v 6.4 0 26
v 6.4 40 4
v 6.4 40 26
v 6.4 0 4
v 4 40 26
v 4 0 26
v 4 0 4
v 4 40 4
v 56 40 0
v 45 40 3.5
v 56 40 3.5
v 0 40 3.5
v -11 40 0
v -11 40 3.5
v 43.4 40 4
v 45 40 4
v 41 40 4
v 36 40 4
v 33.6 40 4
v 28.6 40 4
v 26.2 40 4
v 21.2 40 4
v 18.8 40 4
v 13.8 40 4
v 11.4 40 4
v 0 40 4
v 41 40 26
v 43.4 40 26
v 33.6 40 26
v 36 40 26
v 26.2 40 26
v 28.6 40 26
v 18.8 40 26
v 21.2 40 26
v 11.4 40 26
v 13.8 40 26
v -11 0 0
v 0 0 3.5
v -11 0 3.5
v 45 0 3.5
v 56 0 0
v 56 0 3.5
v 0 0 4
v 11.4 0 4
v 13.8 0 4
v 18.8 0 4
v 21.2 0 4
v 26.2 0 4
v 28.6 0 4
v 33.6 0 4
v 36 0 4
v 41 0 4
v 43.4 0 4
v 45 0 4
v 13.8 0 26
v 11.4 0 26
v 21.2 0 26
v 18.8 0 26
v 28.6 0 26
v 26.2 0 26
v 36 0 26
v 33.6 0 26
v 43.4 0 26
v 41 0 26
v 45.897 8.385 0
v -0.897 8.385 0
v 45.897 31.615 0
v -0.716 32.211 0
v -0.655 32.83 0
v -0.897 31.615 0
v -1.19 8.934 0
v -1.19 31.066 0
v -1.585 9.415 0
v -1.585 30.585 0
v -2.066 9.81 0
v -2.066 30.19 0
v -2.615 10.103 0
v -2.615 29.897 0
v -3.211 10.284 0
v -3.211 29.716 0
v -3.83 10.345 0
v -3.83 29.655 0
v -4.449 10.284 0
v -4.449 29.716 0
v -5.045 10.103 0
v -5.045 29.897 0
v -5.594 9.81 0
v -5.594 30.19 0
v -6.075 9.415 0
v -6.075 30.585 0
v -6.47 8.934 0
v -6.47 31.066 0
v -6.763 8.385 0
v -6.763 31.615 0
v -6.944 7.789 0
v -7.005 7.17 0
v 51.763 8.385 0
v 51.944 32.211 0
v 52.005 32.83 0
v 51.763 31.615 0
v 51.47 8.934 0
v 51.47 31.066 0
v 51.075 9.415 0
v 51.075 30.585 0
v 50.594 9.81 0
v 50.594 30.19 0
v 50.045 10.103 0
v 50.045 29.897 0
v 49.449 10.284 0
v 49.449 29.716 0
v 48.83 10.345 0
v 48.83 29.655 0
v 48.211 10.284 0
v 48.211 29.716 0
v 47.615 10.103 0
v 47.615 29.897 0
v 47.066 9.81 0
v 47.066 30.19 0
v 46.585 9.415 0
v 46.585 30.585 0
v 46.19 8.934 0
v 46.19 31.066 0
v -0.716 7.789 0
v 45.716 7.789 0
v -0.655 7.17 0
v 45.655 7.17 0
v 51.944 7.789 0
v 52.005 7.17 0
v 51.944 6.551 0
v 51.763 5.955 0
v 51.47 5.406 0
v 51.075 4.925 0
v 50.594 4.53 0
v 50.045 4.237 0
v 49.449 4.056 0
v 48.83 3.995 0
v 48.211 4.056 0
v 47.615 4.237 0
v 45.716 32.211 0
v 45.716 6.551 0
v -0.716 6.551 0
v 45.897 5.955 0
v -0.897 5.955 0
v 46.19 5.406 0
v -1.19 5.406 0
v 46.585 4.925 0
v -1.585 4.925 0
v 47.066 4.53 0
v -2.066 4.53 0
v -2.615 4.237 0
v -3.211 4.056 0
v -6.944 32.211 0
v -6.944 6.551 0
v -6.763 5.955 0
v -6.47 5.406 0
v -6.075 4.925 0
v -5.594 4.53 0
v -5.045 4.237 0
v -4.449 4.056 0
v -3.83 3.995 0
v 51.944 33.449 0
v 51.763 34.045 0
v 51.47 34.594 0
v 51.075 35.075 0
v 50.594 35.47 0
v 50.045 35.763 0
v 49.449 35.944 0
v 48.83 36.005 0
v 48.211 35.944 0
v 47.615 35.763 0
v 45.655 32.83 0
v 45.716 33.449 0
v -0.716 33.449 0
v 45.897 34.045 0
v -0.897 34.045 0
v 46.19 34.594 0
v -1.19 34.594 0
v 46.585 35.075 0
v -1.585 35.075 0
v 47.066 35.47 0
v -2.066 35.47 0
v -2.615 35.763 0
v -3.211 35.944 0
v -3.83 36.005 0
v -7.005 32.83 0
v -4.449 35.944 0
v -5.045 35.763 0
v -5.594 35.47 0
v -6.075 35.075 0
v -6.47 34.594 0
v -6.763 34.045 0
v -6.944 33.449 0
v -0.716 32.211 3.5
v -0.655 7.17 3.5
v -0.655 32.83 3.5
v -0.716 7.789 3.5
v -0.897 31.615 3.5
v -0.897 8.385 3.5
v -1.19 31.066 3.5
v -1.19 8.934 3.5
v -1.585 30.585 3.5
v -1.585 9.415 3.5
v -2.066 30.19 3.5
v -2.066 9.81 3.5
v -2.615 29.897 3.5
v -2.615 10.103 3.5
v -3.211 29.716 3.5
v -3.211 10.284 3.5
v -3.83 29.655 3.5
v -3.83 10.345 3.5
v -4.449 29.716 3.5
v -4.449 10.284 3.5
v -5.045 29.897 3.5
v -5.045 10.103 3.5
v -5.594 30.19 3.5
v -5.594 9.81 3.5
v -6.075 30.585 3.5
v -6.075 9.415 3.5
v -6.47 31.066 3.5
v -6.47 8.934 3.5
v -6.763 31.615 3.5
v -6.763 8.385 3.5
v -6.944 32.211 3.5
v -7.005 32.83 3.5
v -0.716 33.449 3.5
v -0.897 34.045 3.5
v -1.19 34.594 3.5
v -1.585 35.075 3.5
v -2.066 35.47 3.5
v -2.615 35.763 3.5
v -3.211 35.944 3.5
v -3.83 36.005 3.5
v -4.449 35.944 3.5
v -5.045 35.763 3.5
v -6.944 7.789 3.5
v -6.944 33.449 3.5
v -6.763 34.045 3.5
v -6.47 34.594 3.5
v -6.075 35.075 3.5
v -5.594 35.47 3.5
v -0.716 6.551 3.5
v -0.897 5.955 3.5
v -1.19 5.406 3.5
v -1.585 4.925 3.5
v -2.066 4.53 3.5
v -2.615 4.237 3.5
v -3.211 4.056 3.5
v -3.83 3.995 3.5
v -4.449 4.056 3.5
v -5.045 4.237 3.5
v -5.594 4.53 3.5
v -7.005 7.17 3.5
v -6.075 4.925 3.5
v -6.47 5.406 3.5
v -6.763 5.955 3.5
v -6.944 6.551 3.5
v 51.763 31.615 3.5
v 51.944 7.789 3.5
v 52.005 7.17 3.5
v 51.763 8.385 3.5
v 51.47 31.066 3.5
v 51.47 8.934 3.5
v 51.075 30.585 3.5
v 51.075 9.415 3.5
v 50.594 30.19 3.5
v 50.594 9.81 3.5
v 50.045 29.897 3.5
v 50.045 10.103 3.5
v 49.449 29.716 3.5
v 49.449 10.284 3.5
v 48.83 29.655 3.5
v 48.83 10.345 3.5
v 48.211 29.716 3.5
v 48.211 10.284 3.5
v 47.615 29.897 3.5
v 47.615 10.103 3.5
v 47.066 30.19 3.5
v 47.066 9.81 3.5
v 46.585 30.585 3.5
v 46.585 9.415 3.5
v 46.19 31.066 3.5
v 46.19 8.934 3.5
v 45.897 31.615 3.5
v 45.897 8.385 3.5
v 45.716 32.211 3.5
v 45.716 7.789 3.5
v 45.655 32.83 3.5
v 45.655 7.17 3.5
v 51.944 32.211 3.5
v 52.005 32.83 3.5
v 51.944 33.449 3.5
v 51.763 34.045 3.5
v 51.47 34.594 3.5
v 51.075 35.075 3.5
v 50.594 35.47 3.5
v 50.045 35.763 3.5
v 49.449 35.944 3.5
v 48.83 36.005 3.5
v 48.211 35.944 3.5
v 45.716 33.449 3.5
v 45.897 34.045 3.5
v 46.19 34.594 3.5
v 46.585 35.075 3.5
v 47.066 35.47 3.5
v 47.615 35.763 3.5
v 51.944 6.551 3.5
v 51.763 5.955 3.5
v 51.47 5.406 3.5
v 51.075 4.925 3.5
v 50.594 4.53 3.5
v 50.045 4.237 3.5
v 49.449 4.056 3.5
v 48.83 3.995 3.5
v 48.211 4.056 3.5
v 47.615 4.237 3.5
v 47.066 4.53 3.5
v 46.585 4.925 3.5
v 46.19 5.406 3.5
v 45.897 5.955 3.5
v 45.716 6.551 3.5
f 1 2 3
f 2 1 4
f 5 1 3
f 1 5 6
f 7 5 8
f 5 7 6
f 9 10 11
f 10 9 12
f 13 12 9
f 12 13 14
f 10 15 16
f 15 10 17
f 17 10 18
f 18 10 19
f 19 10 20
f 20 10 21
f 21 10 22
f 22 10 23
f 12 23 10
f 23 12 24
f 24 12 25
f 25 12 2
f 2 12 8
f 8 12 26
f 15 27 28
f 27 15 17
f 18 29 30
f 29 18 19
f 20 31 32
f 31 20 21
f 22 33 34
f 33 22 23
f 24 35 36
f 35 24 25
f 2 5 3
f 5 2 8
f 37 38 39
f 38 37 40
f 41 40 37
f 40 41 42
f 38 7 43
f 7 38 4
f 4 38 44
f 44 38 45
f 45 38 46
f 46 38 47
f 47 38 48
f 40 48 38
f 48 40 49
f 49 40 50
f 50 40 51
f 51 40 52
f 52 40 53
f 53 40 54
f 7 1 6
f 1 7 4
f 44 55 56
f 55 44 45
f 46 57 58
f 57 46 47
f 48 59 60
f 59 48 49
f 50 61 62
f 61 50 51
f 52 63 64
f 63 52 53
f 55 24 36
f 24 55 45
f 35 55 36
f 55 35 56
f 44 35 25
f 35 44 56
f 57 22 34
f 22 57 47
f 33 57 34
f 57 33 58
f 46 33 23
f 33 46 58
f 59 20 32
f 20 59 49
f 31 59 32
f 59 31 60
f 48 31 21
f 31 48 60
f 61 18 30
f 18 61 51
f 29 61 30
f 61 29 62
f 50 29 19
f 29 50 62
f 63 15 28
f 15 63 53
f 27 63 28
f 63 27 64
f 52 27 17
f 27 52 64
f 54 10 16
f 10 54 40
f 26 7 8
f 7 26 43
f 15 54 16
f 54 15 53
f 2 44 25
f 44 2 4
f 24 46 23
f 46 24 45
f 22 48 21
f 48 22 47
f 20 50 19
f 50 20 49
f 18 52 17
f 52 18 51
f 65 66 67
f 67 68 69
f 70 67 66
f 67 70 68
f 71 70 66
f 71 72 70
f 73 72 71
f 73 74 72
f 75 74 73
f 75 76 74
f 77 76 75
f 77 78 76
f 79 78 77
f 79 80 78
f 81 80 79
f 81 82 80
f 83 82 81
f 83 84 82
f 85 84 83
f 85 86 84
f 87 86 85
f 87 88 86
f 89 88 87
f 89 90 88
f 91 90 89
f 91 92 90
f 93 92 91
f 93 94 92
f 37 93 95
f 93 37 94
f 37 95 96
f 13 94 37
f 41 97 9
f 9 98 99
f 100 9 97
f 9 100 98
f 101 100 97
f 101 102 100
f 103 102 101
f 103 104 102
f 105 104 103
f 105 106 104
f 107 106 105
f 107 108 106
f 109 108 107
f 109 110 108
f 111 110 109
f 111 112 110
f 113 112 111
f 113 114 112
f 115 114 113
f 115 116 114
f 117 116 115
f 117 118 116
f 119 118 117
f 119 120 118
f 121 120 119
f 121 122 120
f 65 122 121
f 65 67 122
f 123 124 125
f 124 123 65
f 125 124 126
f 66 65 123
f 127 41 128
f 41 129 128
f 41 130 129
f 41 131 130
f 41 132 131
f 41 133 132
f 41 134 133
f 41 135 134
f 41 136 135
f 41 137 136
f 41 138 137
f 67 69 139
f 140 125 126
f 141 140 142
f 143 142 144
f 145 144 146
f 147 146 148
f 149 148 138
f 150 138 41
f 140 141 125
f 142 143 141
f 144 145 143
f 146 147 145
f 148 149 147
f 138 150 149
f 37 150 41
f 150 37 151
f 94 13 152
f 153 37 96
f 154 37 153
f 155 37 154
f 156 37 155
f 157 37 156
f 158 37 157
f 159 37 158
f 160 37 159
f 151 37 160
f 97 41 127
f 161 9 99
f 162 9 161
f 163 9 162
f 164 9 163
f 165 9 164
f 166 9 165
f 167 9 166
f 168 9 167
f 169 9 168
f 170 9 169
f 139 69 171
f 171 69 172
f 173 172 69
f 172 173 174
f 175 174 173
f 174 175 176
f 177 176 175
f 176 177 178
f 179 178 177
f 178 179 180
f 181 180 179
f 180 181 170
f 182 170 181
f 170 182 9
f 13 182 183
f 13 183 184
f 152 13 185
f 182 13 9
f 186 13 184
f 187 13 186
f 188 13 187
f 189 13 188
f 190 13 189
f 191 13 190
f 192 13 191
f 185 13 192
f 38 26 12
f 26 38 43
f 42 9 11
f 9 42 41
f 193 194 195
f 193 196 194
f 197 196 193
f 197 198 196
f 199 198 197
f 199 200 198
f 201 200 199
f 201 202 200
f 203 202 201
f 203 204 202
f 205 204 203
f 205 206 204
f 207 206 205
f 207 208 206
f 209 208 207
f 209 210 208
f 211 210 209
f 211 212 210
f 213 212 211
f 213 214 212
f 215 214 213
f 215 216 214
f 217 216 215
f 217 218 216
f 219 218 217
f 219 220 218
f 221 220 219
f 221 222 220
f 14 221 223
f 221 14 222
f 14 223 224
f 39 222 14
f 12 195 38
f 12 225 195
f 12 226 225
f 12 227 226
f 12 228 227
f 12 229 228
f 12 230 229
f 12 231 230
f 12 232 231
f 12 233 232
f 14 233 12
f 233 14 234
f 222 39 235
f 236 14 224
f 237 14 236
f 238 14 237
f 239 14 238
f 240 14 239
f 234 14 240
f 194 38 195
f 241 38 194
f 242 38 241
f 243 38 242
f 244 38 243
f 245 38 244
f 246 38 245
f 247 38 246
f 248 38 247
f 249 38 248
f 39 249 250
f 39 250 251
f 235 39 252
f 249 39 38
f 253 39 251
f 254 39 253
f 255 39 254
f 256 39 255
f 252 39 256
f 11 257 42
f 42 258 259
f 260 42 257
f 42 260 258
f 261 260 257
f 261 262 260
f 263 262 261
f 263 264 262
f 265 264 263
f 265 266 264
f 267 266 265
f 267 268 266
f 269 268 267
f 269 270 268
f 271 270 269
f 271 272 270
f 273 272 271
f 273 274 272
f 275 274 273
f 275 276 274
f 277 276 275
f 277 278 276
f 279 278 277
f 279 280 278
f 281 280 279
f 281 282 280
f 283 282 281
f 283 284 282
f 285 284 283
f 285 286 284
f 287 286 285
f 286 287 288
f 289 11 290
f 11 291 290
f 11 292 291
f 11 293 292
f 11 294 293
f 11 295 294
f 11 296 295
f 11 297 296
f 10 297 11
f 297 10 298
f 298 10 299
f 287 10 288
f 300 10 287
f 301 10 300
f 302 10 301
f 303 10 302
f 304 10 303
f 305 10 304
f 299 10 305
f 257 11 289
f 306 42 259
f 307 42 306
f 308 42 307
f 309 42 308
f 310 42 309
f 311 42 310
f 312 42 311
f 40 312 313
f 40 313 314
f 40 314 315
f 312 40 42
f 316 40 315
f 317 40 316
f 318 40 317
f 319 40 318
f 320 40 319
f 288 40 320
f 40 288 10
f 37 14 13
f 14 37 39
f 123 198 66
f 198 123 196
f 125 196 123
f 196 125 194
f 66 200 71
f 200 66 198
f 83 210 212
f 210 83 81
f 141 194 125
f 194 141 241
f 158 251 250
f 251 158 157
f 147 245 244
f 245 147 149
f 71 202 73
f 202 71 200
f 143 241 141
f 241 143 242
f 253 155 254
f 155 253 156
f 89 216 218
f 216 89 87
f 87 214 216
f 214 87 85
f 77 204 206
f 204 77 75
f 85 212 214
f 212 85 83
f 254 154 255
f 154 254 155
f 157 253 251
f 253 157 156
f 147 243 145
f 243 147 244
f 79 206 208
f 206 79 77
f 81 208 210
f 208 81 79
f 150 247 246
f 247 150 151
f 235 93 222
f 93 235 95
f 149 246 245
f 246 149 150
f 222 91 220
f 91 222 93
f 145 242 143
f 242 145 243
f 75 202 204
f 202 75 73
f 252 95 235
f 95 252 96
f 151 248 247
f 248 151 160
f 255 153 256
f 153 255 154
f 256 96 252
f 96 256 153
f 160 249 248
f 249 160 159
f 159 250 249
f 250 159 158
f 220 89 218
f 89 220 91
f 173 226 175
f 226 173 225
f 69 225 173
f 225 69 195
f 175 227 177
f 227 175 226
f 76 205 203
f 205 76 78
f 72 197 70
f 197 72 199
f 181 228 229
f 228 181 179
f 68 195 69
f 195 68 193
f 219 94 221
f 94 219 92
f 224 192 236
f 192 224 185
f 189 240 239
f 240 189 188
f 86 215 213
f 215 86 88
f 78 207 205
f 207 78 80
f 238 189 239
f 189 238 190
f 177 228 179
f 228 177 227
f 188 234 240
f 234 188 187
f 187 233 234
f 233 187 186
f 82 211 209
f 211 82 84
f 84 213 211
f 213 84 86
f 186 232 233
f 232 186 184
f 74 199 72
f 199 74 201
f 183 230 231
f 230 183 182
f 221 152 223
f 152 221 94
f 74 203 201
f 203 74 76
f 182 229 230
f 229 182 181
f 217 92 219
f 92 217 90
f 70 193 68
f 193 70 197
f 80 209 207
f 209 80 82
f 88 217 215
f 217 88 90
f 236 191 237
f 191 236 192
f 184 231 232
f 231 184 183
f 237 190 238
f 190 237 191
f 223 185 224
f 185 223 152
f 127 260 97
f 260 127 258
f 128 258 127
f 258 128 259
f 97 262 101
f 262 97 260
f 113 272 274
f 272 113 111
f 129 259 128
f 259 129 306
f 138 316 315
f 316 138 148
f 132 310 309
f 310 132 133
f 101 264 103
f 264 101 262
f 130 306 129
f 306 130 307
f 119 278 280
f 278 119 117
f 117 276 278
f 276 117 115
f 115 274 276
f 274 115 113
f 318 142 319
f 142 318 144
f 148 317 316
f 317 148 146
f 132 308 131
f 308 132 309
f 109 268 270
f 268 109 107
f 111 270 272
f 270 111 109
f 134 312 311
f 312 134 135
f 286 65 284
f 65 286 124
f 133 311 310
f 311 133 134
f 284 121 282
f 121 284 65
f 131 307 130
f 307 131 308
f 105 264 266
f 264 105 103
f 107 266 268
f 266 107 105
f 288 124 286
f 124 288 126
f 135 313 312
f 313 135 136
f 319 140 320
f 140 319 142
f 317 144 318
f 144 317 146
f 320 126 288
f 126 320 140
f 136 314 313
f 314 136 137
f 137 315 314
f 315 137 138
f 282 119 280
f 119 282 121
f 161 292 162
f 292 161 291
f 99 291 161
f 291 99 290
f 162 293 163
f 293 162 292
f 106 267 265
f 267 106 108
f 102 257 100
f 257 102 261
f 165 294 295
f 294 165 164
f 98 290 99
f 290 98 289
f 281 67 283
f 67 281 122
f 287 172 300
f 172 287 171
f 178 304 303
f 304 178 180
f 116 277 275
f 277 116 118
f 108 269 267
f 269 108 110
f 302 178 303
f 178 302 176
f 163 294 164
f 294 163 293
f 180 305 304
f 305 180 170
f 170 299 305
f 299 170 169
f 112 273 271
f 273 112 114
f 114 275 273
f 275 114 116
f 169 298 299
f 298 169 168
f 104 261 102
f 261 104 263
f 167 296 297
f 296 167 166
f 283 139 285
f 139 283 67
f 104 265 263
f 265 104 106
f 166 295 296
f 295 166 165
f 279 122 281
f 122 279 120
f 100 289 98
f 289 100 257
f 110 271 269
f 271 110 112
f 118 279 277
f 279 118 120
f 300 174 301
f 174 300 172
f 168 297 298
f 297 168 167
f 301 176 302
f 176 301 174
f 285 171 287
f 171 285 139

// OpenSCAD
$fn = 32;

// ----------------------------------------------------------------------
// Finned heat sink: 45 x 40 mm base, 22 mm fins
// ----------------------------------------------------------------------

// --- parameters (mm) ---
base_w = 45;              // base width
base_d = 40;              // base depth
base_t = 4;               // base thickness
fin_h = 22;               // fin height above the base
holes_d = 6.35;           // fixing holes
hole_x = 26.33;           // hole offset in x
hole_y = 12.83;           // hole offset in y
fin_t = 2.4;              // fin thickness
fin_pitch = 7.4;          // fin pitch
fin_count = 6;            // number of fins
fin_x0 = 4;               // first fin offset
flange_w = 67;            // flange plate width
flange_t = 3;             // flange plate thickness

difference() {
  union() {
    cube([base_w, base_d, base_t]);
    for (i = [0 : fin_count - 1]) {
      translate([fin_x0 + i * fin_pitch, 0, base_t - 0.5]) cube([fin_t, base_d, fin_h + 0.5]);
    }
    /* mounting flange, a wider plate sharing the base bottom */
    translate([(base_w - flange_w) / 2, 0, 0]) cube([flange_w, base_d, flange_t + 0.5]);
  }
  /* fixing holes through the base, 2.5 mm clear on both sides */
  for (hx = [-26.33, 26.33]) {
    for (hy = [-12.83, 12.83]) {
      translate([base_w / 2 + hx, base_d / 2 + hy, -2.5]) cylinder(h = base_t + 5, d = holes_d);
    }
  }
}
